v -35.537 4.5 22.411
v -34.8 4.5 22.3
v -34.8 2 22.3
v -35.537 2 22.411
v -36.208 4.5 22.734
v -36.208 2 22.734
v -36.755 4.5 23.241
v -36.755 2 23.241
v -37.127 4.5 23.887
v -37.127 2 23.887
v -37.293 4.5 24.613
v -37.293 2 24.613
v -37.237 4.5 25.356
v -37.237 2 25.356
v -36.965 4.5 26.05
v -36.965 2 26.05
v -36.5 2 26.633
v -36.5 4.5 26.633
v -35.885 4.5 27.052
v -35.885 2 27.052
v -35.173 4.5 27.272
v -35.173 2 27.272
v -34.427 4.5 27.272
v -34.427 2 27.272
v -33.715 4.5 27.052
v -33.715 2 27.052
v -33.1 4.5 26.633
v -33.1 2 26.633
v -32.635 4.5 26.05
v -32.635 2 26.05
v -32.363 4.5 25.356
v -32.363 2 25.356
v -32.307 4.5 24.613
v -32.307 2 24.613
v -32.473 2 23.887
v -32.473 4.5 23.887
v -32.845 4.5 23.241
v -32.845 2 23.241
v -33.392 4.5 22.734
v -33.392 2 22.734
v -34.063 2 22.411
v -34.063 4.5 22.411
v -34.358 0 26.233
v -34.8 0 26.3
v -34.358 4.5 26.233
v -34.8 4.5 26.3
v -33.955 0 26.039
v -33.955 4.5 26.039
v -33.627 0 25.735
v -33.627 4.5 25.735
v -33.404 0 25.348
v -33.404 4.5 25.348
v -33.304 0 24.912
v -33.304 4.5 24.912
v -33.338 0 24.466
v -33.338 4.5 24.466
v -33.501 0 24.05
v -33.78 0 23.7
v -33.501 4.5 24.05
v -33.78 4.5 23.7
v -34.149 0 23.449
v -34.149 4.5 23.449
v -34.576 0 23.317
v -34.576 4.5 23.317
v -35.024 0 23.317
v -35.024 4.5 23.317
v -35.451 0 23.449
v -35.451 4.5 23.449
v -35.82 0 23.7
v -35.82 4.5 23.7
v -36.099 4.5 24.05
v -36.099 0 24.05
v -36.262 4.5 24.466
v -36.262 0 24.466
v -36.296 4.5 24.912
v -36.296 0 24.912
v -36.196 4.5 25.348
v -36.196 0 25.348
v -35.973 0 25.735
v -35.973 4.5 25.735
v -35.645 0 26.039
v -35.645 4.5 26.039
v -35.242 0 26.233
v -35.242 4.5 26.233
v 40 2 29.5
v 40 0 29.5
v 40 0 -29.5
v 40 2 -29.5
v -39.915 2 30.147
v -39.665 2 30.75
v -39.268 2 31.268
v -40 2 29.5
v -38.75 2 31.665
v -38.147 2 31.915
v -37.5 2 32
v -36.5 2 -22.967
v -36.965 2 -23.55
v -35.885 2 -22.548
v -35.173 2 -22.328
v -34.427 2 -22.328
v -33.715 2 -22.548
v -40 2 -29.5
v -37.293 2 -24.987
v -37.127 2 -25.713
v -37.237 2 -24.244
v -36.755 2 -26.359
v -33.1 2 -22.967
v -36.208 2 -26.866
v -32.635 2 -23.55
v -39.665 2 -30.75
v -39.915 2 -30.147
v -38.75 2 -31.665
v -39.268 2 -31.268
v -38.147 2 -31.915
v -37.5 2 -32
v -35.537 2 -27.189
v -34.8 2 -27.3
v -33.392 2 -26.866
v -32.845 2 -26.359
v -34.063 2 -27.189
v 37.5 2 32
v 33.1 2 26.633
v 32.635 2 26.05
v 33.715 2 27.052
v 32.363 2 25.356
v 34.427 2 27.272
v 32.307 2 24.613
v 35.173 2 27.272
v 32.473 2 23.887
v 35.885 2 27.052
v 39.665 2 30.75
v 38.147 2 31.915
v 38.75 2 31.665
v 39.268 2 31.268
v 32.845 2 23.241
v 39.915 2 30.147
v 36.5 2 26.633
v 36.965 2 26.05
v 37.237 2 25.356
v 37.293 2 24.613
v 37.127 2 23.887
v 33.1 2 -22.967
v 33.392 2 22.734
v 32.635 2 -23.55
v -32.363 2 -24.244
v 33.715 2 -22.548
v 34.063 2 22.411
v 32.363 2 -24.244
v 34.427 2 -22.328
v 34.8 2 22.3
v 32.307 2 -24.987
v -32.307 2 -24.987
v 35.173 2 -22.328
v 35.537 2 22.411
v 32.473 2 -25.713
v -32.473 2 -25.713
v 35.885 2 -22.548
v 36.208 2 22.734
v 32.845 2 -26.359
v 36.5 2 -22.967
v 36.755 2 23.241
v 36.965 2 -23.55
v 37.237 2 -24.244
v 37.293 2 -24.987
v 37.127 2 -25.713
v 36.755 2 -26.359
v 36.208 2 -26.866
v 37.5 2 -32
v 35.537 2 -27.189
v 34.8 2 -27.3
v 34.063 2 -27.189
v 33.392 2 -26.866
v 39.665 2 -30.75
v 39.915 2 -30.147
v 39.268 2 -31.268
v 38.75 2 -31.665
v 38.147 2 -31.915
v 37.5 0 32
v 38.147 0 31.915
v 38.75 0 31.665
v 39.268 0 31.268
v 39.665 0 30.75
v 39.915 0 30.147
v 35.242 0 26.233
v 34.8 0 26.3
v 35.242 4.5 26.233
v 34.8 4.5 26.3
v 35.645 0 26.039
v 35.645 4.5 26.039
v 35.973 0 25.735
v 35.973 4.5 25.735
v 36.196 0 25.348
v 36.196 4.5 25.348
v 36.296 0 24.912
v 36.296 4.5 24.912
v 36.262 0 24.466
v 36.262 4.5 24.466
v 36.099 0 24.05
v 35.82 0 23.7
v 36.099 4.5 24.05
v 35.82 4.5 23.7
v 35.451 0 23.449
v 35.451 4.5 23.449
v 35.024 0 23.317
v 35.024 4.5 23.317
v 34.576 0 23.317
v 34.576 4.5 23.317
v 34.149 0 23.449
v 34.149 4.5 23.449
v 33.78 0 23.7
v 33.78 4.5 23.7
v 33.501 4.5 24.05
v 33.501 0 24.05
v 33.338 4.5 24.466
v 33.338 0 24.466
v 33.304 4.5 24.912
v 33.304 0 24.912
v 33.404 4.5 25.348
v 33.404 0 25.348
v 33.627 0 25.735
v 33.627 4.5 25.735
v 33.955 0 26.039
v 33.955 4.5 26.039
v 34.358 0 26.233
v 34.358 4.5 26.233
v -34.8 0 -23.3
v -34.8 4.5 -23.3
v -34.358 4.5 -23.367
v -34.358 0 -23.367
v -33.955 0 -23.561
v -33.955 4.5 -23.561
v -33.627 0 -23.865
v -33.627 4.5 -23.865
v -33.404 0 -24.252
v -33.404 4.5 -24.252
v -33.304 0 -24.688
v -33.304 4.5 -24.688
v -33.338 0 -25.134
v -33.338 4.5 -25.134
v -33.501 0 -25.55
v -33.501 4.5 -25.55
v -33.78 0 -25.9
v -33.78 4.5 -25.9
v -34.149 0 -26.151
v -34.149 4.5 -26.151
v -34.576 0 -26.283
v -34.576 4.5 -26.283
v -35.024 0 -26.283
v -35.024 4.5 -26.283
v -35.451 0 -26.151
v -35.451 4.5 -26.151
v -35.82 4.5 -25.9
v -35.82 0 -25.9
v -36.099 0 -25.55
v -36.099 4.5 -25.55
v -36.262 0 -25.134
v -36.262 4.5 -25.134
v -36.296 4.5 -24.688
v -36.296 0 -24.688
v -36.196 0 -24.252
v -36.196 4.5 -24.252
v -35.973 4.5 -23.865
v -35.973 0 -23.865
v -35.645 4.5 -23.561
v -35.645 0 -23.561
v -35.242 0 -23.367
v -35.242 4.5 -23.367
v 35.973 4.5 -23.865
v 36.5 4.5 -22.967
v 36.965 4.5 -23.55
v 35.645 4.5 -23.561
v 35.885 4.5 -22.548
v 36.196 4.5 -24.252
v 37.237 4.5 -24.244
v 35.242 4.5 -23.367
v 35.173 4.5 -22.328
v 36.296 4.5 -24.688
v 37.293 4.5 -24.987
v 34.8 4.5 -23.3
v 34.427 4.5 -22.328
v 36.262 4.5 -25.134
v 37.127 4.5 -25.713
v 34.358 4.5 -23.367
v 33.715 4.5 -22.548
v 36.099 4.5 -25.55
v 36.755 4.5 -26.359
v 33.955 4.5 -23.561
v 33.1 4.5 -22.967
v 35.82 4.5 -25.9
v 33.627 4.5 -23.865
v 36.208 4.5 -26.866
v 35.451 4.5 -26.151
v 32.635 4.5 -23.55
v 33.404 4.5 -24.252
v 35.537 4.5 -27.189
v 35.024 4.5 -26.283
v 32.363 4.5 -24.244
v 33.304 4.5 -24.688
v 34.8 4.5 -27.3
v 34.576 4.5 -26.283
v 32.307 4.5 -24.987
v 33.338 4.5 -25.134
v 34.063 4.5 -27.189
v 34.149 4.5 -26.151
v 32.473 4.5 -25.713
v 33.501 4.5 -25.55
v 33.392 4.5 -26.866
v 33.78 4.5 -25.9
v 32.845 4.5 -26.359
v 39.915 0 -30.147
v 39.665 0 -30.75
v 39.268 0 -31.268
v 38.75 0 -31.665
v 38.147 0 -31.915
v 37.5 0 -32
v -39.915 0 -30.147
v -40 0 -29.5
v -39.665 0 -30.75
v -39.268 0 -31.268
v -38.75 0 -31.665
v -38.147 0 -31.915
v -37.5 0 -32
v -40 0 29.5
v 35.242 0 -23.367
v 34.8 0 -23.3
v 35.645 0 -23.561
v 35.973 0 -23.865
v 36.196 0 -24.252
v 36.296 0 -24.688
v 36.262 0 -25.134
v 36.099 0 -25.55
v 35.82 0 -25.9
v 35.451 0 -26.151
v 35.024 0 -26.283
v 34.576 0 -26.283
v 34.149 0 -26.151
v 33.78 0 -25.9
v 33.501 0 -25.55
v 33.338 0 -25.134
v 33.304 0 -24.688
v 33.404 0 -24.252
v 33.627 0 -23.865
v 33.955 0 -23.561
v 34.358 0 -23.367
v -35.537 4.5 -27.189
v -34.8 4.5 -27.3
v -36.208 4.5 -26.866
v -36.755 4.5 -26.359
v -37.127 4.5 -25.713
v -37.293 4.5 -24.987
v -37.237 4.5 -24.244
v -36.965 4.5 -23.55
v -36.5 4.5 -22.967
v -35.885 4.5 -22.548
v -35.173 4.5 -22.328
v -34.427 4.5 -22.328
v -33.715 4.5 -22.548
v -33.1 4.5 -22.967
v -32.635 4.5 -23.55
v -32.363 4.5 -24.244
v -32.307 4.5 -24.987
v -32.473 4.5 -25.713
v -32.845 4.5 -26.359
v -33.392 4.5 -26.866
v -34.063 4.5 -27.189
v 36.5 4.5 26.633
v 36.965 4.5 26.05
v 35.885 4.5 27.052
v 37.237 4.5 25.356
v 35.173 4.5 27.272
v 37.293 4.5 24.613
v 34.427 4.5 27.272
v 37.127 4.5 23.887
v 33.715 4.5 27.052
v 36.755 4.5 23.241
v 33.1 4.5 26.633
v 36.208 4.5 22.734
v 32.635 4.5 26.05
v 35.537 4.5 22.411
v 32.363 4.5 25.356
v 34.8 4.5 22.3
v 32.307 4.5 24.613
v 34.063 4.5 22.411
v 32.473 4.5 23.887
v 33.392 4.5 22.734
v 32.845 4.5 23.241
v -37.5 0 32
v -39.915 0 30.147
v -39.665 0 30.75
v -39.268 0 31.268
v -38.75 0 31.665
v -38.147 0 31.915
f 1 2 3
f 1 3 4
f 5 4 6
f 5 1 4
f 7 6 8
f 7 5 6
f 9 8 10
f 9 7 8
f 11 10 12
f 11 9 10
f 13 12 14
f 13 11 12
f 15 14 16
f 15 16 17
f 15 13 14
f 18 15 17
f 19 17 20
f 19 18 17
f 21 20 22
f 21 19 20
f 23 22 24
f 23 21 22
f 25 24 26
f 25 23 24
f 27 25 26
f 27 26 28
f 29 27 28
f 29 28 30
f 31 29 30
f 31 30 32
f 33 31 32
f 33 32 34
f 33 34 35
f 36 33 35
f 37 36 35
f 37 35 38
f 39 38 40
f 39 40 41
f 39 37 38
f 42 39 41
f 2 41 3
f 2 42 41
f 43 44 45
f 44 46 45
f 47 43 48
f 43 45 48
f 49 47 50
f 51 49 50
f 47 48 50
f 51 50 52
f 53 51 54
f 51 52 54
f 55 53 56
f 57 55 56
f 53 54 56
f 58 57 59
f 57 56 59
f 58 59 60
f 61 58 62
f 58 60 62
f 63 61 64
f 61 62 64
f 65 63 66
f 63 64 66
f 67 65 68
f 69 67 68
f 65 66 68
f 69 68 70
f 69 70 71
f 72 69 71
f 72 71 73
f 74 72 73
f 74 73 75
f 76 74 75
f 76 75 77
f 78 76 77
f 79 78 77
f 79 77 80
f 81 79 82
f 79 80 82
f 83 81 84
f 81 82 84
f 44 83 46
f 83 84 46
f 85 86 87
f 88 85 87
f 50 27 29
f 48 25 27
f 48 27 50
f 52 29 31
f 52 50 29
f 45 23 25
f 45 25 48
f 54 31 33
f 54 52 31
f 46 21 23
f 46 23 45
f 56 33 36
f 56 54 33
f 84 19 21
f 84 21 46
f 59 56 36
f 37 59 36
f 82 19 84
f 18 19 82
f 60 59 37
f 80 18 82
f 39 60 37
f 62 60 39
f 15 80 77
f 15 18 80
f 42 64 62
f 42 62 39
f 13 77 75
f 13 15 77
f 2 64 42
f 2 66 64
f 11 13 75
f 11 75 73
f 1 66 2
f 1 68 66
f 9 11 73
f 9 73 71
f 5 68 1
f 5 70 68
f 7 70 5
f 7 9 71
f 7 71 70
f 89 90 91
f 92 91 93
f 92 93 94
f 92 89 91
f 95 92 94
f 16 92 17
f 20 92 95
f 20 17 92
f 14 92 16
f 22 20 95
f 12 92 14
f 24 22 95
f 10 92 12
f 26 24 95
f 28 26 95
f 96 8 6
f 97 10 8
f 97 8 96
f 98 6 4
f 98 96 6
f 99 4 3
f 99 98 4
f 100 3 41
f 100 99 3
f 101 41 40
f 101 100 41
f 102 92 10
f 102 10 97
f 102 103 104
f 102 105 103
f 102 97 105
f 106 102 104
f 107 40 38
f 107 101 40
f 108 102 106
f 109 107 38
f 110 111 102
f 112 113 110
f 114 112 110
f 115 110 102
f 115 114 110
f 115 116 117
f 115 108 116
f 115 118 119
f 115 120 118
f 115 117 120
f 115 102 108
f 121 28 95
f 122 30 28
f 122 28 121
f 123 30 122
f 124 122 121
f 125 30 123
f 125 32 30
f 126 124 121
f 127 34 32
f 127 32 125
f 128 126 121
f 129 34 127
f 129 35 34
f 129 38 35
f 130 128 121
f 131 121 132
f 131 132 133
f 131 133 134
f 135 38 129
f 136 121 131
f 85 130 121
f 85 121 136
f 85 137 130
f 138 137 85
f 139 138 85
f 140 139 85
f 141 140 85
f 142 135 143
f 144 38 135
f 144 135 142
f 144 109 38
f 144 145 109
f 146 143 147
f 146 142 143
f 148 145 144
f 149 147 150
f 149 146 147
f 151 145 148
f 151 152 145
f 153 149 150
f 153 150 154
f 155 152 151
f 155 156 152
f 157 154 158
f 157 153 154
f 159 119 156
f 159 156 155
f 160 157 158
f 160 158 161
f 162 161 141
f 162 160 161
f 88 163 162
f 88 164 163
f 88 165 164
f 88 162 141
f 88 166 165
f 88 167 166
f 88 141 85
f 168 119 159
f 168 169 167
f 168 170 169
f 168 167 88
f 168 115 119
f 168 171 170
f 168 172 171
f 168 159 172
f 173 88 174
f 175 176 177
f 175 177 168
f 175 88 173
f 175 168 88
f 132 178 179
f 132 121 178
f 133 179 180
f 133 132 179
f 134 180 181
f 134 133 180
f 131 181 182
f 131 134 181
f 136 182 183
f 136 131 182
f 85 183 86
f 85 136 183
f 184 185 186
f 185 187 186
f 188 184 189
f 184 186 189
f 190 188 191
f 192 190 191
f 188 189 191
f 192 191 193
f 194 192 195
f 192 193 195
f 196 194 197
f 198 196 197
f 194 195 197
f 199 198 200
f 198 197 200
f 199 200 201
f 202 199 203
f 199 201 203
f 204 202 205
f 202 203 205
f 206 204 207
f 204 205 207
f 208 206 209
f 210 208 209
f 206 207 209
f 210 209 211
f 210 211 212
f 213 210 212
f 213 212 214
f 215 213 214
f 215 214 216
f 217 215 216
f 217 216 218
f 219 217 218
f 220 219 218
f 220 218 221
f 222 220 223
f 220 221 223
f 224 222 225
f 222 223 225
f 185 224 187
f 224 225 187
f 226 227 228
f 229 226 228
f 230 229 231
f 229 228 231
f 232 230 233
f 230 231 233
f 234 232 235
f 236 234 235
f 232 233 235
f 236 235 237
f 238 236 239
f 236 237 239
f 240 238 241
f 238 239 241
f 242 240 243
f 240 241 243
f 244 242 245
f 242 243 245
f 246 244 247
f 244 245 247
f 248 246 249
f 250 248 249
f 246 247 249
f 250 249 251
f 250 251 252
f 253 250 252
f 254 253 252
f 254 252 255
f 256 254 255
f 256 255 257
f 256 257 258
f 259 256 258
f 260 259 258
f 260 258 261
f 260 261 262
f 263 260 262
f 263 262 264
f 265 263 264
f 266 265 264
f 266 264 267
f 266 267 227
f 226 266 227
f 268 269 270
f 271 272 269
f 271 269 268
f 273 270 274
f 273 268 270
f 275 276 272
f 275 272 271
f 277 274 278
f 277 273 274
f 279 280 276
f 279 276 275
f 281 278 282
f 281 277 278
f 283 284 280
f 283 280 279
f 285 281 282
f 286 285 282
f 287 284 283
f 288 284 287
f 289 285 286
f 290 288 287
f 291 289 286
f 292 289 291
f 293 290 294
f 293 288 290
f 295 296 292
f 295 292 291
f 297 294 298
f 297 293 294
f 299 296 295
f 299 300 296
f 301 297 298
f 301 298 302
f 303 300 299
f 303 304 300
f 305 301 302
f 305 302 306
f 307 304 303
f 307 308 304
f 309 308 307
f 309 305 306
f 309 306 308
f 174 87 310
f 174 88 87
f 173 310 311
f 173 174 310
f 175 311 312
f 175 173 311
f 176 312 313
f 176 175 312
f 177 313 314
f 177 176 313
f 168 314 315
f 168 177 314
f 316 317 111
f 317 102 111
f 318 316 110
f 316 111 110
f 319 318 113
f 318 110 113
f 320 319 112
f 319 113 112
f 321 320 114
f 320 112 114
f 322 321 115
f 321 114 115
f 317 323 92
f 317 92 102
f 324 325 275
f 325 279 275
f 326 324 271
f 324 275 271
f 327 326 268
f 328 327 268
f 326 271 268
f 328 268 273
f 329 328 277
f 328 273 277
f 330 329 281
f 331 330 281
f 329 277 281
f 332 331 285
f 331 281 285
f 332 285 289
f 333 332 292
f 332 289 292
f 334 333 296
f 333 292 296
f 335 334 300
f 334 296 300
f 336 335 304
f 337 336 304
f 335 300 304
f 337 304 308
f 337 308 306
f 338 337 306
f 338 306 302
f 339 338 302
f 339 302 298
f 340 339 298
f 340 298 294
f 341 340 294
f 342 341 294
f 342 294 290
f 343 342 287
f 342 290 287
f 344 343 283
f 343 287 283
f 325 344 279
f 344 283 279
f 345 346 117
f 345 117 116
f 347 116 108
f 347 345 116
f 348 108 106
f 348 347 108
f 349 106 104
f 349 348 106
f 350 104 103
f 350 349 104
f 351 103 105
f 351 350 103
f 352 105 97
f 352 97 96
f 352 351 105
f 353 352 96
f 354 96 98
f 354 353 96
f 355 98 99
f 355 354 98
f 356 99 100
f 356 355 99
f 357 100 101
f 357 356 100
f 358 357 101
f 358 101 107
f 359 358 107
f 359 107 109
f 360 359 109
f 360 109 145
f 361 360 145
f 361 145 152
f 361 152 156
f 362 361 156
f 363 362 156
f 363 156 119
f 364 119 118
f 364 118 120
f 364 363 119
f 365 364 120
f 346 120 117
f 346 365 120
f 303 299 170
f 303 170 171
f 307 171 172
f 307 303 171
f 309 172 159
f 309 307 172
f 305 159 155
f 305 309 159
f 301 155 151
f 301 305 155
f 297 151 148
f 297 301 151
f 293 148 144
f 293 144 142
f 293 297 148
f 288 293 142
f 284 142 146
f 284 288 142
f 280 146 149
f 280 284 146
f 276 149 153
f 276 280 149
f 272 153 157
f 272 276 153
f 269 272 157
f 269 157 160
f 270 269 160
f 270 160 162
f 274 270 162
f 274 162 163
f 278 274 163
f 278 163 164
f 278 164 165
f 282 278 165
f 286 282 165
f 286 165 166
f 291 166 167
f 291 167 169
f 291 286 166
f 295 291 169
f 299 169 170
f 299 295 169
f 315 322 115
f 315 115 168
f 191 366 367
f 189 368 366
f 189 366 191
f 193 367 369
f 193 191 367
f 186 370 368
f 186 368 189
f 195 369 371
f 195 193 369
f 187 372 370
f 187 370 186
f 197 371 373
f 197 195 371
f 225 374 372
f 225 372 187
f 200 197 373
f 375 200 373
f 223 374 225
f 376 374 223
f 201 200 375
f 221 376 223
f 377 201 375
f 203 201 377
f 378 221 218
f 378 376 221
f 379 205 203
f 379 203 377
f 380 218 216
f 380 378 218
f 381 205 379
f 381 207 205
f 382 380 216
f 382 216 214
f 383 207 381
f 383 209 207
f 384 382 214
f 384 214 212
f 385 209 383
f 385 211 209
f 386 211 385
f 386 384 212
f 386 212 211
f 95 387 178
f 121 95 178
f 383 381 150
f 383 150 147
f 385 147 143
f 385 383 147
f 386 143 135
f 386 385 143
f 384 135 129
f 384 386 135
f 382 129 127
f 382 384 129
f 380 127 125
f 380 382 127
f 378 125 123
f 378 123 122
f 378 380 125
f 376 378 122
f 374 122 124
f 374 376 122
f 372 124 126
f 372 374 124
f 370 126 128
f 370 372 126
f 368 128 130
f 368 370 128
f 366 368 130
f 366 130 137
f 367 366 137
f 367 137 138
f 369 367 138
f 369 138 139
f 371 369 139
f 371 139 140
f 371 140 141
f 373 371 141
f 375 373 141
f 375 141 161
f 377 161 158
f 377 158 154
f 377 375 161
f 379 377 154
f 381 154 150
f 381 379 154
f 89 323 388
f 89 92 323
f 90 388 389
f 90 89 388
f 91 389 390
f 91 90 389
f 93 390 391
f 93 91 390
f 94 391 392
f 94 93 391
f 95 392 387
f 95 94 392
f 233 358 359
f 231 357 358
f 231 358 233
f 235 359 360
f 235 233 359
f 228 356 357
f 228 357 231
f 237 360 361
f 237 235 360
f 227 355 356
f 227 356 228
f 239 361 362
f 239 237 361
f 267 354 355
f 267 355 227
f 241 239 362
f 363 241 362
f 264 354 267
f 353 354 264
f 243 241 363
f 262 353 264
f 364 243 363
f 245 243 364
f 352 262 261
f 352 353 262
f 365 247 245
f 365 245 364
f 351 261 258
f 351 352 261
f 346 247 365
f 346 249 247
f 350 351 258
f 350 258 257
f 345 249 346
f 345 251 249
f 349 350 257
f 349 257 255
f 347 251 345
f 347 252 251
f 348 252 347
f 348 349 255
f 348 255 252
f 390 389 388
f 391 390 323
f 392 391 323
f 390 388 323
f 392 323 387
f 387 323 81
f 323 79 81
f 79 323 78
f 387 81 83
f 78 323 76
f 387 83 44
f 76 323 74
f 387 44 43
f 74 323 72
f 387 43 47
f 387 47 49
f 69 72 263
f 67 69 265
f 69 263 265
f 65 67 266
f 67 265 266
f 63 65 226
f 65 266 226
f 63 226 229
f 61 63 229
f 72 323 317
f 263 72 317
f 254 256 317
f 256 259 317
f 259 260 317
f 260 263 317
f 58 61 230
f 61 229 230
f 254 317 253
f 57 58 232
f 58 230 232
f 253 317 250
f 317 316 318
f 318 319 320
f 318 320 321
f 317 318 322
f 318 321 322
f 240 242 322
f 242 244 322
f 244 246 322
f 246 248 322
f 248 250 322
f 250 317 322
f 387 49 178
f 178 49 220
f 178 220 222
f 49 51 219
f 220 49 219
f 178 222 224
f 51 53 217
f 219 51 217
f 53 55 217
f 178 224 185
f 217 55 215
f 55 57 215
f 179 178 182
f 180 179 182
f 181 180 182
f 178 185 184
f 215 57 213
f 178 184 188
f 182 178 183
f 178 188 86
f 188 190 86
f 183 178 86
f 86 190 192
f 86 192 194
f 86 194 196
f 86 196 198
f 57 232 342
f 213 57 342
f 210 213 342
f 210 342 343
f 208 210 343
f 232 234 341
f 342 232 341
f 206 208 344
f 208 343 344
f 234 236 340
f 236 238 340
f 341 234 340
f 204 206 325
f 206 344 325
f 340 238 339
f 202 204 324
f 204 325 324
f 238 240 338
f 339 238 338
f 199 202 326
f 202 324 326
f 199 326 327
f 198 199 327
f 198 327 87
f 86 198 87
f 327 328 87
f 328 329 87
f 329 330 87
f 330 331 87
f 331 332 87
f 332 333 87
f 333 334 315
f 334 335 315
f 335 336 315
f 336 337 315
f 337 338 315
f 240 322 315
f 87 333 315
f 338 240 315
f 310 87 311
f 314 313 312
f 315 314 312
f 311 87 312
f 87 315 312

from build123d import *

# Parameters (mm, degrees)
SKETCH1_W           = 80
SKETCH1_H           = 64
BOSS_EXTRUDE1_DEPTH = 2
FILLET1_R           = 2.5
SKETCH2_R           = 1.5
CUT_EXTRUDE1_DEPTH  = 2
BOSS_EXTRUDE2_START = 2.5
SKETCH3_R           = 2.5
SKETCH3_R_2         = 1.5
BOSS_EXTRUDE2_DEPTH = 2.5


with BuildPart() as part:
    # Sketch1 → Boss-Extrude1 (new body)
    with BuildSketch(Plane(origin=(0, 0, 0), x_dir=(1, 0, 0), z_dir=(0, 1, 0))):
        Rectangle(SKETCH1_W, SKETCH1_H)
    extrude(amount=BOSS_EXTRUDE1_DEPTH)

    # Fillet1
    fillet1_edges = [part.edges().sort_by_distance(p)[0] for p in [
        (40, 1, 32),
        (-40, 1, 32),
        (-40, 1, -32),
        (40, 1, -32),
    ]]
    fillet(fillet1_edges, radius=FILLET1_R)

    # Sketch2 → Cut-Extrude1 (cut)
    with BuildSketch(Plane(origin=(-9.018883196, 2, 9.463275917), x_dir=(1, 0, 0), z_dir=(0, 1, 0))):
        with Locations(Location((-25.781116804, 34.263275917, 0), (0, 0, 270))):
            Circle(SKETCH2_R)
        with Locations(Location((43.818883196, 34.263275917, 0), (0, 0, 270))):
            Circle(SKETCH2_R)
        with Locations(Location((43.818883196, -15.336724083, 0), (0, 0, 270))):
            Circle(SKETCH2_R)
        with Locations(Location((-25.781116804, -15.336724083, 0), (0, 0, 270))):
            Circle(SKETCH2_R)
    extrude(amount=-CUT_EXTRUDE1_DEPTH, mode=Mode.SUBTRACT)

    # Sketch3 → Boss-Extrude2 (add)
    # profile 1 of 4: a face of its own
    with BuildSketch(Plane(origin=(0, 2, 0), x_dir=(1, 0, 0), z_dir=(0, 1, 0)).offset(BOSS_EXTRUDE2_START)):
        with Locations(Location((-34.8, 24.8, 0), (0, 0, 90))):
            Circle(SKETCH3_R)
        with Locations(Location((-34.8, 24.8, 0), (0, 0, 270))):
            Circle(SKETCH3_R_2, mode=Mode.SUBTRACT)
    # profile 2 of 4: a face of its own
    with BuildSketch(Plane(origin=(0, 2, 0), x_dir=(1, 0, 0), z_dir=(0, 1, 0)).offset(BOSS_EXTRUDE2_START)):
        with Locations(Location((-34.8, -24.8, 0), (0, 0, 90))):
            Circle(SKETCH3_R)
        with Locations(Location((-34.8, -24.8, 0), (0, 0, 270))):
            Circle(SKETCH3_R_2, mode=Mode.SUBTRACT)
    # profile 3 of 4: a face of its own
    with BuildSketch(Plane(origin=(0, 2, 0), x_dir=(1, 0, 0), z_dir=(0, 1, 0)).offset(BOSS_EXTRUDE2_START)):
        with Locations(Location((34.8, 24.8, 0), (0, 0, 90))):
            Circle(SKETCH3_R)
        with Locations(Location((34.8, 24.8, 0), (0, 0, 270))):
            Circle(SKETCH3_R_2, mode=Mode.SUBTRACT)
    # profile 4 of 4: a face of its own
    with BuildSketch(Plane(origin=(0, 2, 0), x_dir=(1, 0, 0), z_dir=(0, 1, 0)).offset(BOSS_EXTRUDE2_START)):
        with Locations(Location((34.8, -24.8, 0), (0, 0, 90))):
            Circle(SKETCH3_R)
        with Locations(Location((34.8, -24.8, 0), (0, 0, 270))):
            Circle(SKETCH3_R_2, mode=Mode.SUBTRACT)
    extrude(amount=-BOSS_EXTRUDE2_DEPTH)


solid = part.part
